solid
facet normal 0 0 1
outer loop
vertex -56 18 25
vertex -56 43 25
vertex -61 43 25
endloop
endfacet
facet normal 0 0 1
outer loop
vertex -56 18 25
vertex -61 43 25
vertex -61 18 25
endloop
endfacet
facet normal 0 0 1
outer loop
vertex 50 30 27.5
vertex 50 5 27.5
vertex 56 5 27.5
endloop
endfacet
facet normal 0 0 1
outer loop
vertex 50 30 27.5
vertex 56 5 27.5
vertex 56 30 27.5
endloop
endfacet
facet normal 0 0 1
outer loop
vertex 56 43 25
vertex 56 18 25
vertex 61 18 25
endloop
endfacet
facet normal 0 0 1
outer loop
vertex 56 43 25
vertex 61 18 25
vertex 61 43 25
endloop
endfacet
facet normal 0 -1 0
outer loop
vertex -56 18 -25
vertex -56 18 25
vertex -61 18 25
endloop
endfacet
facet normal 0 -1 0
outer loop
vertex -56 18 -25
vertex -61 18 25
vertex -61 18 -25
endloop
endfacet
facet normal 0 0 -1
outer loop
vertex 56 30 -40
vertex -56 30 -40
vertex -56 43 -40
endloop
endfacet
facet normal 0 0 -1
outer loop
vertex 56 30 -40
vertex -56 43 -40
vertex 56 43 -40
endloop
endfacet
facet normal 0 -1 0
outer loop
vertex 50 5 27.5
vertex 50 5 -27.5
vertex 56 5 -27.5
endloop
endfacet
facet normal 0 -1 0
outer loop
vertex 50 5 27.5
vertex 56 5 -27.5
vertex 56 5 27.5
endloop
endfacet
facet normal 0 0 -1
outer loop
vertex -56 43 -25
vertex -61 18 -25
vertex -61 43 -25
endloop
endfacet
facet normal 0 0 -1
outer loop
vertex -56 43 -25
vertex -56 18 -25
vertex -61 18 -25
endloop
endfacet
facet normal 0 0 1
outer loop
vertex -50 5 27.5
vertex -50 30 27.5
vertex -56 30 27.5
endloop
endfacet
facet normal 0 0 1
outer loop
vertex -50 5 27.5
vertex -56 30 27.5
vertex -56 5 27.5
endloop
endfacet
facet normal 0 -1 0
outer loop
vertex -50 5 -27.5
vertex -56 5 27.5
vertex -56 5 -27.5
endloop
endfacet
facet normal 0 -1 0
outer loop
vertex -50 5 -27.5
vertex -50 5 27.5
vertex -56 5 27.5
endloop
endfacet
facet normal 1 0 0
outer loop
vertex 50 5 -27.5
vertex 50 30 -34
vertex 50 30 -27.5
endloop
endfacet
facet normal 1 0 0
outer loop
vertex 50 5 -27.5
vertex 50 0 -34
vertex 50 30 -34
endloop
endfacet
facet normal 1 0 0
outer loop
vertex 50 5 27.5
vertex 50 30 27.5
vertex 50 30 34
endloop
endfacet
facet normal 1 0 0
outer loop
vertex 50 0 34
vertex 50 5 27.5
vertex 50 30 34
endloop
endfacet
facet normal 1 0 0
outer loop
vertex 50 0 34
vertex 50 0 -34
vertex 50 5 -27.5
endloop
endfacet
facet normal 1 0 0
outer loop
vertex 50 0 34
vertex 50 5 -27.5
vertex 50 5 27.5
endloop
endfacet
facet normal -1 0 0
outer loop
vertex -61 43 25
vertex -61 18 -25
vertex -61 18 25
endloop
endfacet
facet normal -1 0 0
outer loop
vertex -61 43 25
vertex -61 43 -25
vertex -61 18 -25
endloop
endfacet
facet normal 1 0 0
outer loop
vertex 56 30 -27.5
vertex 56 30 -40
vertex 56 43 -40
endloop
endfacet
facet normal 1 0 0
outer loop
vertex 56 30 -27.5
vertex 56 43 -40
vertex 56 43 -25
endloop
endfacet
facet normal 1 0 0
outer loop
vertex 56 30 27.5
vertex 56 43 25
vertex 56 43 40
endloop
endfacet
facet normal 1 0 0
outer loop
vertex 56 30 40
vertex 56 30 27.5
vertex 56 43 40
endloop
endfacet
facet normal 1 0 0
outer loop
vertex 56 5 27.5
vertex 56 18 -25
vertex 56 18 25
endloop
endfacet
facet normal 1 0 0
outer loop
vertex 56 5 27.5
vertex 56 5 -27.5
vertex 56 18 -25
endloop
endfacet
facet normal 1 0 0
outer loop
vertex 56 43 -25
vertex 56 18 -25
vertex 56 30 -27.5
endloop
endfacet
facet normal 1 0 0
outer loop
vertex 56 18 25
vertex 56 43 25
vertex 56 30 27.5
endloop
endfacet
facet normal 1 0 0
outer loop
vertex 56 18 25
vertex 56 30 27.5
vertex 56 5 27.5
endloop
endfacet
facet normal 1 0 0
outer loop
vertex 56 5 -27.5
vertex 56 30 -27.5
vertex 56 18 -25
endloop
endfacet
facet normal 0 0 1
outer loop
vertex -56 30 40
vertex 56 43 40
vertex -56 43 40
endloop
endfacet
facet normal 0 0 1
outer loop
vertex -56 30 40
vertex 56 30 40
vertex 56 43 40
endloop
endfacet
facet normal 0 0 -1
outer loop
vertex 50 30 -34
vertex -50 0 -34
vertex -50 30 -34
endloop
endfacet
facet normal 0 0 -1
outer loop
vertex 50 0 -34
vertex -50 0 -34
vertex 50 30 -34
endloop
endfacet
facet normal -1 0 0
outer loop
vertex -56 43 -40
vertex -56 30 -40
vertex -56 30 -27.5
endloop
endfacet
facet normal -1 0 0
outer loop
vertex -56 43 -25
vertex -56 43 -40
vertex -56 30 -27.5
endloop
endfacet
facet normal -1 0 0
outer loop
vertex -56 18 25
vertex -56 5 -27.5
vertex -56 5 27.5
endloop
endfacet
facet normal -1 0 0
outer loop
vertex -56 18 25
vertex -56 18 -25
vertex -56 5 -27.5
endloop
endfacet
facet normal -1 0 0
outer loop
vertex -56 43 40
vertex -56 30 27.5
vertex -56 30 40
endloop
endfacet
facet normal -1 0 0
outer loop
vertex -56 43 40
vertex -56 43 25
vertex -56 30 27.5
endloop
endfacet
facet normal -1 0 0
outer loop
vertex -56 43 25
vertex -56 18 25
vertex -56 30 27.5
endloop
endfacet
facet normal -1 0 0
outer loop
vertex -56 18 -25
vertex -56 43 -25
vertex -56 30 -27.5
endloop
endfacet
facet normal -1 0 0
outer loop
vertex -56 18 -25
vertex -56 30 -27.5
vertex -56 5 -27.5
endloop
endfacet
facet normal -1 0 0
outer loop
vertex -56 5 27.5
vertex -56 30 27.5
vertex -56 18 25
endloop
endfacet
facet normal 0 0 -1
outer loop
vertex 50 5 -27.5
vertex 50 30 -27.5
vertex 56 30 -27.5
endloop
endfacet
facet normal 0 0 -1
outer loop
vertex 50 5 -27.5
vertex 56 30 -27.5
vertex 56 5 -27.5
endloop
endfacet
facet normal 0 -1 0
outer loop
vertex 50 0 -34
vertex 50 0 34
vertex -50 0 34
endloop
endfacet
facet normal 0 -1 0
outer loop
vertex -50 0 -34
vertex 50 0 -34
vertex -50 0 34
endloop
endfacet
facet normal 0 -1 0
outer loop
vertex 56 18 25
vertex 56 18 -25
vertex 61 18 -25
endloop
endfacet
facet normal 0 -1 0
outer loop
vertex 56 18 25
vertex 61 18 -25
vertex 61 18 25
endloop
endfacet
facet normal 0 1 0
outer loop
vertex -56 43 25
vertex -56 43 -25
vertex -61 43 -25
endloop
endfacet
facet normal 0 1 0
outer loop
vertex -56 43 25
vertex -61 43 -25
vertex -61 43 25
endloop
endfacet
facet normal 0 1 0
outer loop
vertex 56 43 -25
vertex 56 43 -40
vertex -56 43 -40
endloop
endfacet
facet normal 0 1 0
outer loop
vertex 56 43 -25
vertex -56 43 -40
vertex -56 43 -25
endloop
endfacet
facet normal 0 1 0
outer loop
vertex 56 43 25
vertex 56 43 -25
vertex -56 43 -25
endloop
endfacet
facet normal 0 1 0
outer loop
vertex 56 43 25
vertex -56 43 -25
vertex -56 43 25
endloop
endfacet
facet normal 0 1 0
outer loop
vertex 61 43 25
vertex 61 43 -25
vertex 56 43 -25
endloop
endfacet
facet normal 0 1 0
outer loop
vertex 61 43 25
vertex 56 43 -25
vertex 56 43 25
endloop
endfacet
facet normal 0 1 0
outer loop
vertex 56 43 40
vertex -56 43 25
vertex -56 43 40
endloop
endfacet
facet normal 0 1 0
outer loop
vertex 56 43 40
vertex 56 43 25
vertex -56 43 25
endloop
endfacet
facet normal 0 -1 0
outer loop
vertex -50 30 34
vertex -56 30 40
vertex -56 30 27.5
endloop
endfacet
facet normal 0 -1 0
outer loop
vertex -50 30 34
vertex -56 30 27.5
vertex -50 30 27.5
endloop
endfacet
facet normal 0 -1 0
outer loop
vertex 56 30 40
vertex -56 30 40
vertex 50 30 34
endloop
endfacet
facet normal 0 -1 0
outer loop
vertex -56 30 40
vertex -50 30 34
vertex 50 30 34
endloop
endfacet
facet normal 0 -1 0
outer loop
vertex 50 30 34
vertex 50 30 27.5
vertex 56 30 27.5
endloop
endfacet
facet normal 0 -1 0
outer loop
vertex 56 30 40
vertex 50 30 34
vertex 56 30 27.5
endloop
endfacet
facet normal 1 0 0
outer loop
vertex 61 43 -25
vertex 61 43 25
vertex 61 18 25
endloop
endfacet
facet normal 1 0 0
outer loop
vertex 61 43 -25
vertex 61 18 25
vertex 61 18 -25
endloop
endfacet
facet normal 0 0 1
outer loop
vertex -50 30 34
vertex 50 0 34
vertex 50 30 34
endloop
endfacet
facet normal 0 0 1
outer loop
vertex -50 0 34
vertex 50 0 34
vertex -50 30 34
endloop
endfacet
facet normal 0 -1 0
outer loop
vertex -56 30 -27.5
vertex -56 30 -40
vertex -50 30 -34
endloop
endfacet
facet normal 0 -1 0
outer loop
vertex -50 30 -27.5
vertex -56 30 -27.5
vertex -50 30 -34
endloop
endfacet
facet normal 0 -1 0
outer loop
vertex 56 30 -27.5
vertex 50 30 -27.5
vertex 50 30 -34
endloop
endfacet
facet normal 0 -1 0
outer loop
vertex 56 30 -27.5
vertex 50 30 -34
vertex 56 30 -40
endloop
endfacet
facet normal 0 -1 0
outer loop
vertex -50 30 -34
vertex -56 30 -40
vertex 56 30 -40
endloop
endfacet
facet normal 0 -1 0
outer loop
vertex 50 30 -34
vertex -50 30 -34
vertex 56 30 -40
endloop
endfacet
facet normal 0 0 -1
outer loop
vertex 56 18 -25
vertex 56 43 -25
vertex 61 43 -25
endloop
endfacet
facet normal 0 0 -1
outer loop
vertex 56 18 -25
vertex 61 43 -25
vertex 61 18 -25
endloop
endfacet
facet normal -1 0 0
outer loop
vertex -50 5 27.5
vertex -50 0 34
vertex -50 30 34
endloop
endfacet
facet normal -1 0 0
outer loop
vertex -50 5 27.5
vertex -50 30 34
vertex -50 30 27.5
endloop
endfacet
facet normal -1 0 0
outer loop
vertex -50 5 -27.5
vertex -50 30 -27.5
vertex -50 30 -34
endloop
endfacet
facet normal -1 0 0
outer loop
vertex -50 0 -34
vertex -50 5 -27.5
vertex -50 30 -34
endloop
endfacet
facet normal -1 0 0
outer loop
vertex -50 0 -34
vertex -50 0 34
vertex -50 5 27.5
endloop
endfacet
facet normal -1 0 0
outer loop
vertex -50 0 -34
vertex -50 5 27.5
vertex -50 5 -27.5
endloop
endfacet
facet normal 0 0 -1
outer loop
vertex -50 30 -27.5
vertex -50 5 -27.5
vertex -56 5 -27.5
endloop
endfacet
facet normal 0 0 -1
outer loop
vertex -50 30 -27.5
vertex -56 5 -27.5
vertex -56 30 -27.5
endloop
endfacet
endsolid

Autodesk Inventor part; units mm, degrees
ref_plane "YZ Plane" through (0, 0, 0) normal (1, 0, 0) x (0, 1, 0)
ref_plane "XZ Plane" through (0, 0, 0) normal (0, 1, 0) x (-1, 0, 0)
ref_plane "XY Plane" through (0, 0, 0) normal (0, 0, 1) x (1, 0, 0)
sketch "Esquisse1" plane through (0, 0, 0) normal (0, 1, 0) x (-1, 0, 0)
  line L0 (-50, 34) -> (50, 34)
  line L1 (50, 34) -> (50, -34)
  line L2 (50, -34) -> (-50, -34)
  line L3 (-50, -34) -> (-50, 34)
  point P0 (0, 0)
  dimension "d0" = 100
  dimension "d1" = 68
  dimension "d2" = 34
  dimension "d3" = 50
extrude "Extrusion1" add sketch "Esquisse1" along normal blind 30
sketch "Esquisse2" plane through (0, 30, 0) normal (0, 1, 0) x (1, 0, 0)
  line L0 (-56, 40) -> (56, 40)
  line L1 (56, 40) -> (56, -40)
  line L2 (56, -40) -> (-56, -40)
  line L3 (-56, -40) -> (-56, 40)
  point P0 (0, 0)
  dimension "d6" = 112
  dimension "d7" = 80
  dimension "d8" = 40
  dimension "d9" = 56
extrude "Extrusion2" add sketch "Esquisse2" along normal blind 13
sketch "Esquisse3" plane through (50, 0, 34) normal (1, 0, 0) x (0, 0, -1)
  line L0 (0, 30) -> (68, 30) projected
  line L1 (6.5, 30) -> (61.5, 30)
  line L2 (61.5, 30) -> (61.5, 5)
  line L3 (61.5, 5) -> (6.5, 5)
  line L4 (6.5, 5) -> (6.5, 30)
  point P0 (34, 0)
  dimension "d12" = 25
  dimension "d13" = 55
  dimension "d14" = 27.5
extrude "Extrusion3" add sketch "Esquisse3" along normal up to surface (6 mm away)
sketch "Esquisse4" plane through (56, 30, -40) normal (1, 0, 0) x (0, 0, -1)
  line L0 (-80, 13) -> (0, 13) projected
  line L1 (-65, 13) -> (-15, 13)
  line L2 (-15, 13) -> (-15, -12)
  line L3 (-15, -12) -> (-65, -12)
  line L4 (-65, -12) -> (-65, 13)
  point P0 (-40, -30)
  dimension "d17" = 50
  dimension "d18" = 25
  dimension "d19" = 25
extrude "Extrusion4" add sketch "Esquisse4" along normal blind 5
mirror "Symétrie1" about plane through (0, 0, 0) normal (1, 0, 0) of "Extrusion4", "Extrusion3"
equation "\"d2\" = 0.5 * d1"
equation "\"d3\" = 0.5 * d0"
equation "\"d8\" = 0.5 * d7"
equation "\"d9\" = 0.5 * d6"
equation "\"d14\" = 0.5 * d13"
equation "\"d19\" = 0.5 * d17"
properties part number "leroy_merlin_boite"
